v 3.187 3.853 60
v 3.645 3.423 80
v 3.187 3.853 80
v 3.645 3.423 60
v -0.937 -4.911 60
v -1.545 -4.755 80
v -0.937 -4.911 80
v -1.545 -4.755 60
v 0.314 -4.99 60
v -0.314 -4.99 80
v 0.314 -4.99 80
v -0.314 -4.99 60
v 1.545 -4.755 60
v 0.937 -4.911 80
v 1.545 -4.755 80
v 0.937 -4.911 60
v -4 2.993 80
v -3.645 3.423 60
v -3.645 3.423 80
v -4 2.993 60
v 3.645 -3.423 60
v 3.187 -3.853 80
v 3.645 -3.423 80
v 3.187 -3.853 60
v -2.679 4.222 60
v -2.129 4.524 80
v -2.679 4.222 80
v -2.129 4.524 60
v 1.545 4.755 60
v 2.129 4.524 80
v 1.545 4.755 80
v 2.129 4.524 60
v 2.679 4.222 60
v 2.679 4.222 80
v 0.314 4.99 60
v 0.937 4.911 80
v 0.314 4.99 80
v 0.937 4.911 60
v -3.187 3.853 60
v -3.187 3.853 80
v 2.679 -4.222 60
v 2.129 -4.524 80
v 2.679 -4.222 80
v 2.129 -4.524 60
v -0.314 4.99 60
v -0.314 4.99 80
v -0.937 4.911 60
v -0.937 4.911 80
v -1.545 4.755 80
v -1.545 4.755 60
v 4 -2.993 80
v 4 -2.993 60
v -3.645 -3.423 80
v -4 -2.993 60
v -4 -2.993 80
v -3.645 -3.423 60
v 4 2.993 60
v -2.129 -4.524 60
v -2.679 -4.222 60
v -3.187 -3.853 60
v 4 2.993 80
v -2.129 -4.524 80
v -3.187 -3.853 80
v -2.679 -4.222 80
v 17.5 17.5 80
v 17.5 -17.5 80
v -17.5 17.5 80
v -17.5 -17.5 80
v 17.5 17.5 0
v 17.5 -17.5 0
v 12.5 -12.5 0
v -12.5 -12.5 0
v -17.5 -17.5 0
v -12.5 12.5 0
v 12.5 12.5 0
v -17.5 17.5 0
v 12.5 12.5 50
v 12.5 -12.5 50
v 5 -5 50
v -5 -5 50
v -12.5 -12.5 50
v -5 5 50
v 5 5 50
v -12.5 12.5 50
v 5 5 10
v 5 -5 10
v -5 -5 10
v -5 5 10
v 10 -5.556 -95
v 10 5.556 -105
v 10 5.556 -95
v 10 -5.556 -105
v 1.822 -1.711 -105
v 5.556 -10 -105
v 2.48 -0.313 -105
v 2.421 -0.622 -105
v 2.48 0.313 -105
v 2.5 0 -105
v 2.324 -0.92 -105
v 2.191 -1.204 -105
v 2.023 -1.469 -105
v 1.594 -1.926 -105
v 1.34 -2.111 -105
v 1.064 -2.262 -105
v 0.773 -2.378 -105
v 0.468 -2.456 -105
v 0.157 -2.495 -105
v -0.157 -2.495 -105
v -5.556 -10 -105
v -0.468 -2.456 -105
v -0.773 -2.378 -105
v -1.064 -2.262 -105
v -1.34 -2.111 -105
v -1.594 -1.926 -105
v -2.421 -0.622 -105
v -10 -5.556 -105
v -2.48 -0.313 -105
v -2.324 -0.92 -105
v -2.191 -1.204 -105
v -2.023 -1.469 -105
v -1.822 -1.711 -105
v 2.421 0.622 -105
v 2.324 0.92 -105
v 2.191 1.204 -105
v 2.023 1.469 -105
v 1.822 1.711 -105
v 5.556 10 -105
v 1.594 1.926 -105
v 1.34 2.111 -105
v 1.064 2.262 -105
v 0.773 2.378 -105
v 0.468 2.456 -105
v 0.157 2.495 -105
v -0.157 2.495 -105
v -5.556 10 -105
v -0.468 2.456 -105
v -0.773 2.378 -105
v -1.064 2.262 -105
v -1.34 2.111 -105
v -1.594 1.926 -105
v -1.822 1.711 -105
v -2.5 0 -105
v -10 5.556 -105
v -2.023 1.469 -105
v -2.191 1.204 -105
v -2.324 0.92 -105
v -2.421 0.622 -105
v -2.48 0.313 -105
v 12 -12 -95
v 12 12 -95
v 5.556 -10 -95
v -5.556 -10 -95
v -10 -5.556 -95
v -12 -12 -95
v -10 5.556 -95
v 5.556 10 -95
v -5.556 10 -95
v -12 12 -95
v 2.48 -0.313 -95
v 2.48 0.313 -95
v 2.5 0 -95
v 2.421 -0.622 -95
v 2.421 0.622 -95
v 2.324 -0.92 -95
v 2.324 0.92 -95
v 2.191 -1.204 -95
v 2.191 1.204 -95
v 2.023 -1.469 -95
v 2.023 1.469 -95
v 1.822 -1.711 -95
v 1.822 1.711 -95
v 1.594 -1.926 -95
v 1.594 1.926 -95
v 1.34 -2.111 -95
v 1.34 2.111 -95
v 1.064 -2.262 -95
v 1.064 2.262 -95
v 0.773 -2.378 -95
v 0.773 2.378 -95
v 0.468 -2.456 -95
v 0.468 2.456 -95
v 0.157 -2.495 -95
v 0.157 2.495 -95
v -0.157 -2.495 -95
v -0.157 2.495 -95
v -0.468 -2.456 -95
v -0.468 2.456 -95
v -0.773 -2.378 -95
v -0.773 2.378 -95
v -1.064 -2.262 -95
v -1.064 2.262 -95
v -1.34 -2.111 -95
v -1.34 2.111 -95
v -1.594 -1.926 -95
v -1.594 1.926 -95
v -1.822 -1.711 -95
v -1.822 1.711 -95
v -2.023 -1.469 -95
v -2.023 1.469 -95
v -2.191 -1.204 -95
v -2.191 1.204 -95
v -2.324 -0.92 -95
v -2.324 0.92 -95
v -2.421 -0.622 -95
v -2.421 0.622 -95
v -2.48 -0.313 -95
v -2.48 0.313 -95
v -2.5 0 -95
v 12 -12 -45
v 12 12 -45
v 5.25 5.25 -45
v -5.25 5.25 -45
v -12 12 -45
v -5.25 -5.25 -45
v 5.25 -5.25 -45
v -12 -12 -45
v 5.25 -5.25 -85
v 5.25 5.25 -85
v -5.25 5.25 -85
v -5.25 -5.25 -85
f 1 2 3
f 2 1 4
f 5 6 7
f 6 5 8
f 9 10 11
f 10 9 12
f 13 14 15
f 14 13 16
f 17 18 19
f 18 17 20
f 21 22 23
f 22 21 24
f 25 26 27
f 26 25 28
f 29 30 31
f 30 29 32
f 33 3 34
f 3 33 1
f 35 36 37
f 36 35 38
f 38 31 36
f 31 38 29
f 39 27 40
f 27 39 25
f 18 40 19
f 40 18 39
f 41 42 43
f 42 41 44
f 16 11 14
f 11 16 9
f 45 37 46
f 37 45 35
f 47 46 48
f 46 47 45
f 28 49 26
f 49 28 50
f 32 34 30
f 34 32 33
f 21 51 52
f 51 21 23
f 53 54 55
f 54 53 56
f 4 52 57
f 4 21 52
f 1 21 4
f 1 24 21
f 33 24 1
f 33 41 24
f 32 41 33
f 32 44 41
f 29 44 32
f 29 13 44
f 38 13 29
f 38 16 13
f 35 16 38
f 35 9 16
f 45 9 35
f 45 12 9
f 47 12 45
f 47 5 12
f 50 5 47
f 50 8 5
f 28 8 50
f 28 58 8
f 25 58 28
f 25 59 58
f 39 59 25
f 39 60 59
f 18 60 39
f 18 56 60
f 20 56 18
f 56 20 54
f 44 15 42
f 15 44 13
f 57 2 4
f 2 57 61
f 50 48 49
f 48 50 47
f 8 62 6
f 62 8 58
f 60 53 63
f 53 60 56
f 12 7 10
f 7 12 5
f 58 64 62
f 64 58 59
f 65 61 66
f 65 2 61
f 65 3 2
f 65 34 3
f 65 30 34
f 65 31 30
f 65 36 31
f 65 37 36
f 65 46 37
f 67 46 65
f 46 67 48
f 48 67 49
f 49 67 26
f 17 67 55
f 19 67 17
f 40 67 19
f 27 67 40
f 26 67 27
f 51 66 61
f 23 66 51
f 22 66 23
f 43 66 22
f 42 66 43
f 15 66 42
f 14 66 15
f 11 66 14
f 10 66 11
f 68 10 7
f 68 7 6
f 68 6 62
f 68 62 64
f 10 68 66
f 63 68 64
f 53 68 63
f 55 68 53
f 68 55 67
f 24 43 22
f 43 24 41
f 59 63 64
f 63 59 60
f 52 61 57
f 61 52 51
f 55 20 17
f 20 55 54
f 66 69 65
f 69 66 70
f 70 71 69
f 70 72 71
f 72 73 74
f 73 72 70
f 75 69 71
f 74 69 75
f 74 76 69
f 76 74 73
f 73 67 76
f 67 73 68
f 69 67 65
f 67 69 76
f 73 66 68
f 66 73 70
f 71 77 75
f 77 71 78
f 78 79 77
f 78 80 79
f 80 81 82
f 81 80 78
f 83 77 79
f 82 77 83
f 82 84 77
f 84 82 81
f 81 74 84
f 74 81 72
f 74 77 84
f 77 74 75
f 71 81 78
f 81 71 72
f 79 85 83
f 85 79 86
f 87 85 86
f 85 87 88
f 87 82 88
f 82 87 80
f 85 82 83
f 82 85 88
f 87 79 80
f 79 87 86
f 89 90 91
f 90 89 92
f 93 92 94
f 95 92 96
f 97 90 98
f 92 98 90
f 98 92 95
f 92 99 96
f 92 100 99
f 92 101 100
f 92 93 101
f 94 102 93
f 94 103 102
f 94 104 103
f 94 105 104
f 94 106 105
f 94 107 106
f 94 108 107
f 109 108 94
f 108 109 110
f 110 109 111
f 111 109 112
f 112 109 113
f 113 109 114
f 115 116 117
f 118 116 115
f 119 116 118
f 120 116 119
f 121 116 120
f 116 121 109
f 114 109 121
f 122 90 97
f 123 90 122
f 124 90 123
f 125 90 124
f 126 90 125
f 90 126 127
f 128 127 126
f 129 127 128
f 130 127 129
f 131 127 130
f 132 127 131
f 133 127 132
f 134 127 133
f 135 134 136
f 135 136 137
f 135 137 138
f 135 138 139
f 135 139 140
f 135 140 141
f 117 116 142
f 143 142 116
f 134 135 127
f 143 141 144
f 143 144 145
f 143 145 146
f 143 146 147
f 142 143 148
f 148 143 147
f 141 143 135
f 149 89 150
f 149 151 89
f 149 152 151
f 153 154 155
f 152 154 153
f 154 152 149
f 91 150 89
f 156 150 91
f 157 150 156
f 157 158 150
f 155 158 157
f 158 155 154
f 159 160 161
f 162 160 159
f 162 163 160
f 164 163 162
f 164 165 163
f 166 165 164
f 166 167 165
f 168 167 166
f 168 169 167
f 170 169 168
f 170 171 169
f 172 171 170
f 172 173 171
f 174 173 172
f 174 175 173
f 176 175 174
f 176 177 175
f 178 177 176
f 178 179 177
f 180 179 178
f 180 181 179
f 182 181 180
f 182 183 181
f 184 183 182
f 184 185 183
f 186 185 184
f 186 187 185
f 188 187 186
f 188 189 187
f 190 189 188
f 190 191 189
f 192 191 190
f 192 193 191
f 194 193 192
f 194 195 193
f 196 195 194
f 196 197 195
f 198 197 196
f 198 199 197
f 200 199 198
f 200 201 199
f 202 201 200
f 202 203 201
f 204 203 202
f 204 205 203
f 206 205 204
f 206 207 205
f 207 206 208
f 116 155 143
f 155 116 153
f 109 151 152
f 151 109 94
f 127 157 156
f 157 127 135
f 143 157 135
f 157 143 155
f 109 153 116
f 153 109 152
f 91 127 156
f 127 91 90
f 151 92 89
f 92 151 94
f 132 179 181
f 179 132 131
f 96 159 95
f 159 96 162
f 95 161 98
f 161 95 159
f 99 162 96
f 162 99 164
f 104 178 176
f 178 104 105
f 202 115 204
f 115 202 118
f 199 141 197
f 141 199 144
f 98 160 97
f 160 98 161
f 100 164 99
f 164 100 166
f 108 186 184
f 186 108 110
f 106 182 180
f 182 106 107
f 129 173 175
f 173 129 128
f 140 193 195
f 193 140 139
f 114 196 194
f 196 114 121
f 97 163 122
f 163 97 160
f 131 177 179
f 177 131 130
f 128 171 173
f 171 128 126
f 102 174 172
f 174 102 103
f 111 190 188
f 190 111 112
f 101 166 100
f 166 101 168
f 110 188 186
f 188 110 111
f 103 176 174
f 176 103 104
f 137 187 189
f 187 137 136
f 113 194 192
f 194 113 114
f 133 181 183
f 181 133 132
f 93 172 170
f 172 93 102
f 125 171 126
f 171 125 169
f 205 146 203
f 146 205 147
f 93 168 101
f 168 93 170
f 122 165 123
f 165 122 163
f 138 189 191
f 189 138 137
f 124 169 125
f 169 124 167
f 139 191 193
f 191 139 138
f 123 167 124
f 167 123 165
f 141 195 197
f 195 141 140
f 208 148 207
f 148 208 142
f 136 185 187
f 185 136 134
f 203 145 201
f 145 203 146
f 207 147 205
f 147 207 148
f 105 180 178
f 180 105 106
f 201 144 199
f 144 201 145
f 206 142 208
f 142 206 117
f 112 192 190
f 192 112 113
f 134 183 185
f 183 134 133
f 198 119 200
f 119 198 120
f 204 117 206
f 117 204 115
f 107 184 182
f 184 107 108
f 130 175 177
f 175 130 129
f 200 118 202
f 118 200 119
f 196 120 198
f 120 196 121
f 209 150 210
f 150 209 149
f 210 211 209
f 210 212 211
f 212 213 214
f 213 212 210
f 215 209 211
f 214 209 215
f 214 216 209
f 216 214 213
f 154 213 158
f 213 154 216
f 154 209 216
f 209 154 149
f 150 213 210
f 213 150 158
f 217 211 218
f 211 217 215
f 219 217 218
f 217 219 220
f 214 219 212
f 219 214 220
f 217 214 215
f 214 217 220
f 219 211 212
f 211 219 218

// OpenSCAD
// file: motor_pipe.scad
include <variables.scad>


module motor_pipe(){
    union(){
        difference(){
            cube(size=[$motorPipeWidth, $motorPipeWidth, $motorPipeHeight]);
            translate([$motorPipeWidthThickness, $motorPipeWidthThickness, 0]){
                cube(
                    size=[
                        $motorPipeWidth - 2 * $motorPipeWidthThickness,
                        $motorPipeWidth - 2 * $motorPipeWidthThickness,
                        $motorPipeHeight - $motorPipeHeightThickness
                    ]
                );
            };
            translate([
                $motorPipeWidth / 2,
                $motorPipeWidth / 2,
                $motorPipeHeight - $motorTreeHeight
                ]){
                intersection(){
                    cylinder(h=$motorTreeHeight, r=$motorTreeRadius);
                    translate([-$motorTreeWidth/2, -$motorTreeRadius, 0]){
                        cube(
                            size=[
                                $motorTreeWidth,
                                2 * $motorTreeRadius,
                                $motorTreeHeight
                                ]
                        );
                    };
                };
            };
        };

        translate([
            ($motorPipeWidth - $springTreeWidth) / 2,
            ($motorPipeWidth - $springTreeWidth) / 2,
            (1 - $springTreeHeightProportion) * ($motorPipeHeight - $motorPipeHeightThickness)
        ]){
            cube(
                size=[
                    $springTreeWidth, $springTreeWidth,
                    $springTreeHeightProportion * ($motorPipeHeight - $motorPipeHeightThickness)
                ]
            );
        };
    };
}
// file: tree_cube.scad
include <variables.scad>


module tree_cube() {
    difference(){
        intersection(){
            cube(
                [$cubeJunctionWidth, $cubeJunctionWidth, $cubeJunctionHeight],
                center=true
            );
            rotate(45){
                cube(
                    [
                        $cubeJunctionDiagonal,
                        $cubeJunctionDiagonal,
                        $cubeJunctionHeight
                    ],
                    center=true
                );
            };
        };
        translate([0, 0, ($cubeJunctionHeight - $cubeJunctionHoleHeight) / 2]){
            cylinder(
                h=$cubeJunctionHoleHeight,
                r=$cubeJunctionHoleRadius,
                center=true
                );
        }
    };

    translate(
        [
            0, 0,
            - ($cubeJunctionHeight + $motorPipeHeight - $motorPipeHeightThickness) / 2
        ]){
        difference(){
            cube([
                $motorPipeWidth - 2 * ($motorPipeWidthThickness + $backlash),
                $motorPipeWidth - 2 * ($motorPipeWidthThickness + $backlash),
                $motorPipeHeight - $motorPipeHeightThickness
                ],
                center=true
                );
            translate(
                [0, 0, -((1 - $springTreeHeightProportion) * ($motorPipeHeight - $motorPipeHeightThickness)) / 2]
                ){
                cube([
                    ($springTreeWidth + $backlash),
                    ($springTreeWidth + $backlash),
                    ($springTreeHeightProportion * ($motorPipeHeight - $motorPipeHeightThickness))
                    ],
                    center=true
                    );
            };

        }
    }
}
// file: variables.scad
// Openscad variables
$fn=50;

// Personal variables
$backlash = 0.5;

$motorPipeWidth = 35;
$motorPipeWidthThickness = 5;
$motorPipeHeight = 80;
$motorPipeHeightThickness = 30;

$motorTreeHeight = 20;
$motorTreeRadius = 5;
$motorTreeWidth = 8;

$springTreeWidth = 10;
$springTreeHeightProportion = 0.8;

$cubeJunctionHoleRadius = 2.5;
$cubeJunctionHoleHeight = 12.5;
$cubeJunctionWidth = 20;
$cubeJunctionHeight = 10;
$cubeJunctionDiagonal = 22;
// main file
include <variables.scad>
include <tree_cube.scad>
include <motor_pipe.scad>


translate([-$motorPipeWidth/2, -$motorPipeWidth/2, 0]){
    motor_pipe();
};

translate([0, 0, -100+80*$t]){
    rotate([180, 0, 0]){
        tree_cube();
    }
}
